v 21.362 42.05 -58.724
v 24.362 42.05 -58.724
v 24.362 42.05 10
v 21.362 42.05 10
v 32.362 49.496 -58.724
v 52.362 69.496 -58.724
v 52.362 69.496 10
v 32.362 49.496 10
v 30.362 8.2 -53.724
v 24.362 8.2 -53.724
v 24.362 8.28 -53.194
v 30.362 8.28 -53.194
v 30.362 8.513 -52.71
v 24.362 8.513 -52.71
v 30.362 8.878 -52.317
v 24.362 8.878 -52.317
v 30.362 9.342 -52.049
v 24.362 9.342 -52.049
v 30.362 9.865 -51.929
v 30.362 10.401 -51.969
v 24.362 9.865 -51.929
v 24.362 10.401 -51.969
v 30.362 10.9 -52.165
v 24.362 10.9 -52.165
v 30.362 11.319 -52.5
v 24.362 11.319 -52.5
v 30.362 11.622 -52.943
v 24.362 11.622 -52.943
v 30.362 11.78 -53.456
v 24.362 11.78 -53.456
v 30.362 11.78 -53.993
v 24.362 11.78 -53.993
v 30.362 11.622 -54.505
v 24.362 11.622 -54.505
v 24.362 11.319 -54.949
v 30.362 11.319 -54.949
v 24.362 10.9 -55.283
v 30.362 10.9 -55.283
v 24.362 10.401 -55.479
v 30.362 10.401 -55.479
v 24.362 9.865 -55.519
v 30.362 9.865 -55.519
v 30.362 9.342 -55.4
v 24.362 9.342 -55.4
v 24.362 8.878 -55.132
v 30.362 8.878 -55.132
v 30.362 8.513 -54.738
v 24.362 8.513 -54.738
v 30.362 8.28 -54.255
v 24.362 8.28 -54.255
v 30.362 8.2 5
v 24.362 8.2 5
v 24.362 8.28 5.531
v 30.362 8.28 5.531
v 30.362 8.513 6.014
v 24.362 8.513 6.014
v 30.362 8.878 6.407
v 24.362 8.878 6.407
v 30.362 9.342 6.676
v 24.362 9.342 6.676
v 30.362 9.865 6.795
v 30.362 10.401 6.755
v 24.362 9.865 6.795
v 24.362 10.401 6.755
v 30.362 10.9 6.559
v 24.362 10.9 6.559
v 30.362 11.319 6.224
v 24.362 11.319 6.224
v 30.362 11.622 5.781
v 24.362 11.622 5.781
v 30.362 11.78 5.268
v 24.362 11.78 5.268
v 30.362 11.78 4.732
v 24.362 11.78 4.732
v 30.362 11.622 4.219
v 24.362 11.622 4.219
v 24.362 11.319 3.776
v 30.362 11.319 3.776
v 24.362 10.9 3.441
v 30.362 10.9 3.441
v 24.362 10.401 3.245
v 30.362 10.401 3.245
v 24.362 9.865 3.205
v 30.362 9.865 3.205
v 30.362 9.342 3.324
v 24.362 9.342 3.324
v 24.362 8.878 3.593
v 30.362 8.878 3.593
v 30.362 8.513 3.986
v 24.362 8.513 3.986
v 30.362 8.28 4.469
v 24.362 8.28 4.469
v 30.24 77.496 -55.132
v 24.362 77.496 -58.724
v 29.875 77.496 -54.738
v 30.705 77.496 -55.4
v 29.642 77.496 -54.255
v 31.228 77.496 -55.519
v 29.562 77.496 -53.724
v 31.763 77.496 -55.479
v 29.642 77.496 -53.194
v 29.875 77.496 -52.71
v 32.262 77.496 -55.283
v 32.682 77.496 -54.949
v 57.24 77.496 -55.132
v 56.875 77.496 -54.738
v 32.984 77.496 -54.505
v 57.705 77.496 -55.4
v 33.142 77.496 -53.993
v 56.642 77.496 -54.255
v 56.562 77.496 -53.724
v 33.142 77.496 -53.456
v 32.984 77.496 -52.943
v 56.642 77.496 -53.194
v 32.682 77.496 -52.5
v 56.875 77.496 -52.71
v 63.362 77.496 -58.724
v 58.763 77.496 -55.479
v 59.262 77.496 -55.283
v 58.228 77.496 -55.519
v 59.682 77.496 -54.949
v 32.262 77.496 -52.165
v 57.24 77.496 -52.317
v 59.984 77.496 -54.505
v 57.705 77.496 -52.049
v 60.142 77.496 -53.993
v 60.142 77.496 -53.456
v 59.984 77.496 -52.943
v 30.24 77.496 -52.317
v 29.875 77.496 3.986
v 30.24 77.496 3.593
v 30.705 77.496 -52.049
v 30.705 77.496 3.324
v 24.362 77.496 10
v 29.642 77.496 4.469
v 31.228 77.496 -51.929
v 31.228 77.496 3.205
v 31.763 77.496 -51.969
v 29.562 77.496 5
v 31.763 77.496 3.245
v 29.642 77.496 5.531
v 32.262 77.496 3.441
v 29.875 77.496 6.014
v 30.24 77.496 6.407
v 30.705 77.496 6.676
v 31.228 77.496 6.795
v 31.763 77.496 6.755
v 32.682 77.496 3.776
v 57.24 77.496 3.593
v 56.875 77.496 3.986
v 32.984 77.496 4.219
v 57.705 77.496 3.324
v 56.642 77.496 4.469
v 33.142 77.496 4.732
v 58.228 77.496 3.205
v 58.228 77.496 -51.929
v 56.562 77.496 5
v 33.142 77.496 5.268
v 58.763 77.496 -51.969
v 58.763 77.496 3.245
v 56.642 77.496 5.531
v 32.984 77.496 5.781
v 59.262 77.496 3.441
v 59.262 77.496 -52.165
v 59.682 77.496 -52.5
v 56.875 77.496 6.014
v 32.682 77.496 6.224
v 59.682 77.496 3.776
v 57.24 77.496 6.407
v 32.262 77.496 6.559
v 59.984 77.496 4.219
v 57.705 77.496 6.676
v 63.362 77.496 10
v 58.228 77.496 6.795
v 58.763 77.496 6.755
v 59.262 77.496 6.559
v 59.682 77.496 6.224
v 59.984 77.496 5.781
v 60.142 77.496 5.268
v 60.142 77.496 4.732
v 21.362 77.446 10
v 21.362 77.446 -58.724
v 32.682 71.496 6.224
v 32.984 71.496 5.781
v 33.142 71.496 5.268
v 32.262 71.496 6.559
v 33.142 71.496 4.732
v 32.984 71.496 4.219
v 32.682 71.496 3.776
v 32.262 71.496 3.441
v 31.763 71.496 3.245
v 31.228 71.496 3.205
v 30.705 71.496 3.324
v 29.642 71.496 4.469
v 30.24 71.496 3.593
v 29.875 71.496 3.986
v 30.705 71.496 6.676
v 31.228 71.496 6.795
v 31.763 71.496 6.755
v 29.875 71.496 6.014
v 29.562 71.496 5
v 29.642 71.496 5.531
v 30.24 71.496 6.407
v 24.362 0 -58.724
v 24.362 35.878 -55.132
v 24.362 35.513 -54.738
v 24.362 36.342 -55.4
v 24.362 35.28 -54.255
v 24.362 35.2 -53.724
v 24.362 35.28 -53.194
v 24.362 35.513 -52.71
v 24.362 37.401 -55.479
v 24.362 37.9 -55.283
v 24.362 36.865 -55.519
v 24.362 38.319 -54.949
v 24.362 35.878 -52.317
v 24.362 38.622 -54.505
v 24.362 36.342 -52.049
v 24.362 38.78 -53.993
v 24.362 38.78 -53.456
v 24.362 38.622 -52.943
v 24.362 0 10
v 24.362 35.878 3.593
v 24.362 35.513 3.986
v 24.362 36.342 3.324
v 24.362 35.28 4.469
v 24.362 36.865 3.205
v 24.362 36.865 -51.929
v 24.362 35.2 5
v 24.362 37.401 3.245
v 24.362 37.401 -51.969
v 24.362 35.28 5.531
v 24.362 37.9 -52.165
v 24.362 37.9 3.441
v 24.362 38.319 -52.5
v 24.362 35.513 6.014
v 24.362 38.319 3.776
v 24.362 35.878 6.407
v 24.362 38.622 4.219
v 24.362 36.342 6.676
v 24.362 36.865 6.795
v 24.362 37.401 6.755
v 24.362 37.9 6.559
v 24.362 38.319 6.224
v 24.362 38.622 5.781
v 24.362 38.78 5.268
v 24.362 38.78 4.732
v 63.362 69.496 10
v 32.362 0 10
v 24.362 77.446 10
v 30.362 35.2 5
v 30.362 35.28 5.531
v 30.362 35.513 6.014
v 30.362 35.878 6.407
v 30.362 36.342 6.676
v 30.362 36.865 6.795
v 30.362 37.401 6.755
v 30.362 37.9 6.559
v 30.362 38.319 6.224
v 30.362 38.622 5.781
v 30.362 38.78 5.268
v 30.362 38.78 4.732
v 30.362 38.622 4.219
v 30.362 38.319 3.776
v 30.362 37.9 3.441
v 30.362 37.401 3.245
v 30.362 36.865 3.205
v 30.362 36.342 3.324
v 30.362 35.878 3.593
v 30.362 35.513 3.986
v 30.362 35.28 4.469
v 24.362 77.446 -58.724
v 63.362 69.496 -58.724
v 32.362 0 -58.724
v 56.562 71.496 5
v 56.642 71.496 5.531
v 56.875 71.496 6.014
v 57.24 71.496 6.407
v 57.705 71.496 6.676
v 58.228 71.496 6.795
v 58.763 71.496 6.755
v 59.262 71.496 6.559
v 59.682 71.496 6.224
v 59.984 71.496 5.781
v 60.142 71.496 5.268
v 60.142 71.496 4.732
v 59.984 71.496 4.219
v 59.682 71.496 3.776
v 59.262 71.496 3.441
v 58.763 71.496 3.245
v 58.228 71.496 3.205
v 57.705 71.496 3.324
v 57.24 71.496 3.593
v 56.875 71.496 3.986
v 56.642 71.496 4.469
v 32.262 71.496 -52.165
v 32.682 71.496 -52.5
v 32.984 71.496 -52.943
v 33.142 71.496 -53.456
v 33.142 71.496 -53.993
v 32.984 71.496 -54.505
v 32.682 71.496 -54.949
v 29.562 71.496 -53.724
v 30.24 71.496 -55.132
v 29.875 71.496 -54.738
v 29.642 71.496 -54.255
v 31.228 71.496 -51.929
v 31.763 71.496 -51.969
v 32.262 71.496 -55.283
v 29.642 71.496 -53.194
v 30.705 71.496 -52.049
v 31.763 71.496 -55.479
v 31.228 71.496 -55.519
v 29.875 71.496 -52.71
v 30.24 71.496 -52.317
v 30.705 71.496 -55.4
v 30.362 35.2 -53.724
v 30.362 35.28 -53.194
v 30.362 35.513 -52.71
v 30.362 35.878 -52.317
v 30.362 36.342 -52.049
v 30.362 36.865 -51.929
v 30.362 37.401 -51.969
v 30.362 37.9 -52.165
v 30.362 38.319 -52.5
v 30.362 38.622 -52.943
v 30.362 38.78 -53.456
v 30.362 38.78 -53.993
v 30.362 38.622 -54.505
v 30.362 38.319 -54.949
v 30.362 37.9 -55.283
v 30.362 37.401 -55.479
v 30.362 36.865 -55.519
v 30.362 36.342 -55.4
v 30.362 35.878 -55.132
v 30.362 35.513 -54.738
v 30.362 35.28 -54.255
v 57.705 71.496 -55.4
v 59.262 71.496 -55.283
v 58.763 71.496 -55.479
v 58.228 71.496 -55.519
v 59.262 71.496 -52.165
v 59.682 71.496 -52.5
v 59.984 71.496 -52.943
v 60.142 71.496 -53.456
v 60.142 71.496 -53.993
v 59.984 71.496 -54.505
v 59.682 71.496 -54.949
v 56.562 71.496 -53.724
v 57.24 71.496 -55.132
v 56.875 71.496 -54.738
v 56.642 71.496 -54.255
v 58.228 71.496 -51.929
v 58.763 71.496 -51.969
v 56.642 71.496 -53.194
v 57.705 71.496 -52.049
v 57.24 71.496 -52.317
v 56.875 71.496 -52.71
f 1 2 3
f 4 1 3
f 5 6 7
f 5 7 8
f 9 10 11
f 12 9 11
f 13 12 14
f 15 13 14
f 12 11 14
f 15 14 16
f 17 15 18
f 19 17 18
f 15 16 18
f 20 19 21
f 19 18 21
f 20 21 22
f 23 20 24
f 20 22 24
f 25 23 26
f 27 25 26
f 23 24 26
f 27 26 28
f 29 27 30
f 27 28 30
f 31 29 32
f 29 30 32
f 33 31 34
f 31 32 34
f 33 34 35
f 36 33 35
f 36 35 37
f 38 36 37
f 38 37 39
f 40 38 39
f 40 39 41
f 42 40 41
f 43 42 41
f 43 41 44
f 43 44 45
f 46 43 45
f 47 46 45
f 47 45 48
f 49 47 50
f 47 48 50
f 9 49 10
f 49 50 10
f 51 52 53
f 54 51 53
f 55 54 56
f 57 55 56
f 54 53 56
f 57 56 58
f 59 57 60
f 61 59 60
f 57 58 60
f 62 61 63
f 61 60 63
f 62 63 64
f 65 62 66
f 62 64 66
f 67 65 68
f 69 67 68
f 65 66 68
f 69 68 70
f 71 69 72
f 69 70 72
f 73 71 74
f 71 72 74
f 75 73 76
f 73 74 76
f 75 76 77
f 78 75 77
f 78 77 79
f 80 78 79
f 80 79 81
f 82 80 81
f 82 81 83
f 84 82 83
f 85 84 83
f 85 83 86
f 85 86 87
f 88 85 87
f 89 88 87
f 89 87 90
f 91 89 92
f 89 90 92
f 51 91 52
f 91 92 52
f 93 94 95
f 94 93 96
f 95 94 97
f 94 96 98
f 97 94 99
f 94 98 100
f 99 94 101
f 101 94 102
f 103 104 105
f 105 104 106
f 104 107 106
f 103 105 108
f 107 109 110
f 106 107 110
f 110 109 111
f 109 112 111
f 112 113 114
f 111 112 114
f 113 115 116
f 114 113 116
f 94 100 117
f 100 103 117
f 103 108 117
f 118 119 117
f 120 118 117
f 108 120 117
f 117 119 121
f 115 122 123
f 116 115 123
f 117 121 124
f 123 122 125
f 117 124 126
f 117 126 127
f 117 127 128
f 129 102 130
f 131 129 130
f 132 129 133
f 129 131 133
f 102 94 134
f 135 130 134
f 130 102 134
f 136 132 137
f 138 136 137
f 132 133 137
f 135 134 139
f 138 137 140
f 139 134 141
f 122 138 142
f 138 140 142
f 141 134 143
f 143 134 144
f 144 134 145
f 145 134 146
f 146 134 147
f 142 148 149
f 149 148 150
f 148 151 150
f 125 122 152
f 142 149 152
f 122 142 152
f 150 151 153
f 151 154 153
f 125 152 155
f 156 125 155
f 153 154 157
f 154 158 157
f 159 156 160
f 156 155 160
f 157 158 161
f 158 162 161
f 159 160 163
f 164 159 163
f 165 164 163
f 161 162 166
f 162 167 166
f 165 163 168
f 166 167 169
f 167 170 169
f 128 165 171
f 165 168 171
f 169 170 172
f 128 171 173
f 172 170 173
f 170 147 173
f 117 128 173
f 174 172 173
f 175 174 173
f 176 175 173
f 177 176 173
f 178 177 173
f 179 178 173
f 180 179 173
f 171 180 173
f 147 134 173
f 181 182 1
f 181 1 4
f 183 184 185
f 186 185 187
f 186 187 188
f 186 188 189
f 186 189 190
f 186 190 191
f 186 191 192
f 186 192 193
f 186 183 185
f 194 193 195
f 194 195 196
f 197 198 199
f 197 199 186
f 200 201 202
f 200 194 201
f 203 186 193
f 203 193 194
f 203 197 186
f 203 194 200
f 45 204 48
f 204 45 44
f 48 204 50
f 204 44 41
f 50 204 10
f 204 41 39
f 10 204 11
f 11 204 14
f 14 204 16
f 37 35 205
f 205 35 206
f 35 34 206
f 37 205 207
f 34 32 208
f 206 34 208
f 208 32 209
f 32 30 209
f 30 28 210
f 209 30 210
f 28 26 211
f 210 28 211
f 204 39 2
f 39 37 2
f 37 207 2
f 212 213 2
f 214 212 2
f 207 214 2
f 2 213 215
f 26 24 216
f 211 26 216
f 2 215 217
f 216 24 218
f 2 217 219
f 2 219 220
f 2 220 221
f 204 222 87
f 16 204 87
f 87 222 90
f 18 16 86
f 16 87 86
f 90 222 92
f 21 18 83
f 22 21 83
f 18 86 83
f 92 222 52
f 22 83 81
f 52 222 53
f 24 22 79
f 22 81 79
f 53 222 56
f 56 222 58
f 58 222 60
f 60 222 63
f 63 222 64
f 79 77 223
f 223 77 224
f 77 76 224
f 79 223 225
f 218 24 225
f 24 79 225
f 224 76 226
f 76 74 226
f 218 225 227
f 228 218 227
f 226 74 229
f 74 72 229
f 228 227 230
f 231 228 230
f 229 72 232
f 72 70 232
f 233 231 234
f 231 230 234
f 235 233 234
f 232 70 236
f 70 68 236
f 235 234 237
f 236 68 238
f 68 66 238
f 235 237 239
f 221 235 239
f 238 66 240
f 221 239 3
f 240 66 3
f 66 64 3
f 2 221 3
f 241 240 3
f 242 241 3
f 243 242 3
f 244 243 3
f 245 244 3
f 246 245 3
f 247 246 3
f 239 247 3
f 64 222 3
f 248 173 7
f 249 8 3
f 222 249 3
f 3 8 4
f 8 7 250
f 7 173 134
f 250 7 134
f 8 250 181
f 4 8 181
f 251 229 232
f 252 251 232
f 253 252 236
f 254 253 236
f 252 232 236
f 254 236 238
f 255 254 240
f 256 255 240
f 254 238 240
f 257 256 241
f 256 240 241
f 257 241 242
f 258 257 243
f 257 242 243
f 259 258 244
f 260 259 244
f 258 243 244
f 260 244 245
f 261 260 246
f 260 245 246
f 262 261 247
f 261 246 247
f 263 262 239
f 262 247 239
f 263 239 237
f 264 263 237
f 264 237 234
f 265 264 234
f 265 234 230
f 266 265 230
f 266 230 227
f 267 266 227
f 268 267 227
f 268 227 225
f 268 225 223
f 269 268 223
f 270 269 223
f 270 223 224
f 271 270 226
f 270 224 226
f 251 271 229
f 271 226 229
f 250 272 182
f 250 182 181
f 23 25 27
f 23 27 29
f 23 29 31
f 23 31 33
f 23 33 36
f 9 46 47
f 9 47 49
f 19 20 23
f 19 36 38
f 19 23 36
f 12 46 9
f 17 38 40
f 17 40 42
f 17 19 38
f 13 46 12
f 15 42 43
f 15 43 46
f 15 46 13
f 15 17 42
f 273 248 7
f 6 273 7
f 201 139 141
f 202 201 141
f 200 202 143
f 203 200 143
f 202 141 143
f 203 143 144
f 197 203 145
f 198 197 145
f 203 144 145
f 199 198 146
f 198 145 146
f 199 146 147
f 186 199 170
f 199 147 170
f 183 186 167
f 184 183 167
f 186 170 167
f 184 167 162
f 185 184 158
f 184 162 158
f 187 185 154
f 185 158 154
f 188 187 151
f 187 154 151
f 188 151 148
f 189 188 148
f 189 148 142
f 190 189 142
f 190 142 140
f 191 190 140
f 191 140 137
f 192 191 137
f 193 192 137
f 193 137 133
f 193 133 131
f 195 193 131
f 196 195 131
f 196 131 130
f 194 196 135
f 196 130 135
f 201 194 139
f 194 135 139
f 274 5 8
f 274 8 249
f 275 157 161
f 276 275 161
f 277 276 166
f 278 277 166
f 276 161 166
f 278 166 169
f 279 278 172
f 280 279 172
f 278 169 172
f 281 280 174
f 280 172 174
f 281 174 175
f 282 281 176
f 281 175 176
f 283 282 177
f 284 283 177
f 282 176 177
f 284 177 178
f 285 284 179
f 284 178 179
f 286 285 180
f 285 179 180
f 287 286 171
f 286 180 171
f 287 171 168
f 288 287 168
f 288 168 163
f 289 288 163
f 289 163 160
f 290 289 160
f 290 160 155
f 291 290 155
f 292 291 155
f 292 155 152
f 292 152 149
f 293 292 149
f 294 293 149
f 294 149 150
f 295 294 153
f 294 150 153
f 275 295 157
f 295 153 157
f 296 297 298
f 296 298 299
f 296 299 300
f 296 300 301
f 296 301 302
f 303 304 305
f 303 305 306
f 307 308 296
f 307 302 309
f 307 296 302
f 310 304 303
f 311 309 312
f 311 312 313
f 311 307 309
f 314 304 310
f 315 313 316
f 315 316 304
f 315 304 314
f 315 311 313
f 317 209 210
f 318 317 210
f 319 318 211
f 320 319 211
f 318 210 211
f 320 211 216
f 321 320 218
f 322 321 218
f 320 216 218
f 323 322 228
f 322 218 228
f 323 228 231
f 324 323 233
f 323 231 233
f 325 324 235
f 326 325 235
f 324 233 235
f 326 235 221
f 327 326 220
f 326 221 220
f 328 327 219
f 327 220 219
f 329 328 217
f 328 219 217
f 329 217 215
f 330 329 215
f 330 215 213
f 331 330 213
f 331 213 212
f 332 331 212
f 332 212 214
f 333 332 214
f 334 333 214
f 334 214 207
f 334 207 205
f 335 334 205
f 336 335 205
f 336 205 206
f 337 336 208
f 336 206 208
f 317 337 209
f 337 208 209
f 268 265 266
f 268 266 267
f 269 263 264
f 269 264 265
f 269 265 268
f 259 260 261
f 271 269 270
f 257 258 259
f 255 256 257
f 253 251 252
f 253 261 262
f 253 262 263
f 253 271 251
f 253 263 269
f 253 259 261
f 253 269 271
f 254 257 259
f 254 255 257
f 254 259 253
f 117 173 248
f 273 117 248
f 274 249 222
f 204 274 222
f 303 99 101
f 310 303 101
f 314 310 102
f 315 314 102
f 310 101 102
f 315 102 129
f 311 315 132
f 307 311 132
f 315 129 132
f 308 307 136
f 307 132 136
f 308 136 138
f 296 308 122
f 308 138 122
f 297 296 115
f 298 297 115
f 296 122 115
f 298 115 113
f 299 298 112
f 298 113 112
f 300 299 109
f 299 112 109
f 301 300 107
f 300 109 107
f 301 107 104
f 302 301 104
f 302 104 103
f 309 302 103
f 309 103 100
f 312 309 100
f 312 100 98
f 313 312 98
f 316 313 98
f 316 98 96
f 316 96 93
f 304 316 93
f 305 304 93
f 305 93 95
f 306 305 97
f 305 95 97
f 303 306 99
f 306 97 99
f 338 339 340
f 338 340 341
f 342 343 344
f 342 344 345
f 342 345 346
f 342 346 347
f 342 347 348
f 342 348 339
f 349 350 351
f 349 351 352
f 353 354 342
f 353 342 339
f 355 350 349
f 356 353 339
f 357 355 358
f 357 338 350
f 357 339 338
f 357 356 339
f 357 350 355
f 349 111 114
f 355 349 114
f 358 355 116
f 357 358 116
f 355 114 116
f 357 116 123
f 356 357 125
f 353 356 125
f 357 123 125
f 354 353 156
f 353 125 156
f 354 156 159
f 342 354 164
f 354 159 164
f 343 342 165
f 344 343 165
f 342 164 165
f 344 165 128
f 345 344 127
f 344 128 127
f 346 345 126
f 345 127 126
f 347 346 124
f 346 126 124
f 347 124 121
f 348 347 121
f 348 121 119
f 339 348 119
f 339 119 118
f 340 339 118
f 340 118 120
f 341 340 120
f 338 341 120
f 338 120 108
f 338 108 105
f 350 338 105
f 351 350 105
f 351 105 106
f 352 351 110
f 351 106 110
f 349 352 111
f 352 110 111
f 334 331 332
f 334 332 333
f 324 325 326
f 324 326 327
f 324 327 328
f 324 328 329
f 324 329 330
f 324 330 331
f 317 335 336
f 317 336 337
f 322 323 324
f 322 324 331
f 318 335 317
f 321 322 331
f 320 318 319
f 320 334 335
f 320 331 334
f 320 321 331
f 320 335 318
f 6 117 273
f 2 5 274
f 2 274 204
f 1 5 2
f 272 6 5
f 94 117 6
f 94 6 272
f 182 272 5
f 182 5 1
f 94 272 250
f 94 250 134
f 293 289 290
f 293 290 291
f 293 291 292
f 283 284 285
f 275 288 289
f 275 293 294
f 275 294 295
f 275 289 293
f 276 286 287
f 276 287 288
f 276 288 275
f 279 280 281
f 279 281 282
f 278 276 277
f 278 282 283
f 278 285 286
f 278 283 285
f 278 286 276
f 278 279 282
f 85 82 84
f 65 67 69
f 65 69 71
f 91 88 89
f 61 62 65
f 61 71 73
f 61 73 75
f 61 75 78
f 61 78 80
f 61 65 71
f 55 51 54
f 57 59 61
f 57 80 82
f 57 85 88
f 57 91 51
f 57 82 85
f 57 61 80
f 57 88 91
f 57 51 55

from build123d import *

# Parameters (mm, degrees)
BOSS_EXTRUDE1_DEPTH = 68.724264069
BOSS_EXTRUDE2_DEPTH = 68.724264069
SKETCH2_R           = 1.8
CUT_EXTRUDE1_DEPTH  = 6
SKETCH3_R           = 1.8
CUT_EXTRUDE2_DEPTH  = 6
SKETCH5_W           = 68.724264069
SKETCH5_H           = 35.396446609
BOSS_EXTRUDE3_DEPTH = 3


with BuildPart() as part:
    # Sketch1 → Boss-Extrude1 (new body)
    with BuildSketch(Plane.XY.offset(10)):
        Polygon((24.362132034, 0), (24.362132034, 77.496446609), (63.362132034, 77.496446609), (63.362132034, 69.496446609), (32.362132034, 69.496446609), (32.362132034, 0), align=None)
    extrude(amount=-BOSS_EXTRUDE1_DEPTH)

    # Sketch4 → Boss-Extrude2 (add)
    with BuildSketch(Plane.XY.offset(10)):
        Polygon((32.362132034, 49.496446609), (32.362132034, 69.496446609), (52.362132034, 69.496446609), align=None)
    extrude(amount=-BOSS_EXTRUDE2_DEPTH)

    # Sketch2 → Cut-Extrude1 (cut)
    with BuildSketch(Plane(origin=(0, 77.496446609, 0), x_dir=(1, 0, 0), z_dir=(0, 1, 0))):
        with Locations(Location((58.362132034, 53.724264069, 0), (0, 0, 180))):
            Circle(SKETCH2_R)
        with Locations(Location((31.362132034, 53.724264069, 0), (0, 0, 180))):
            Circle(SKETCH2_R)
        with Locations(Location((58.362132034, -5, 0), (0, 0, 180))):
            Circle(SKETCH2_R)
        with Locations(Location((31.362132034, -5, 0), (0, 0, 180))):
            Circle(SKETCH2_R)
    extrude(amount=-CUT_EXTRUDE1_DEPTH, mode=Mode.SUBTRACT)

    # Sketch3 → Cut-Extrude2 (cut)
    with BuildSketch(Plane.ZY.offset(-24.362132034)):
        with Locations(Location((-53.724264069, 37, 0), (0, 0, 270))):
            Circle(SKETCH3_R)
        with Locations(Location((-53.724264069, 10, 0), (0, 0, 270))):
            Circle(SKETCH3_R)
        with Locations(Location((5, 10, 0), (0, 0, 270))):
            Circle(SKETCH3_R)
        with Locations(Location((5, 37, 0), (0, 0, 270))):
            Circle(SKETCH3_R)
    extrude(amount=-CUT_EXTRUDE2_DEPTH, mode=Mode.SUBTRACT)

    # Sketch5 → Boss-Extrude3 (add)
    with BuildSketch(Plane.ZY.offset(-24.362132034)):
        with Locations((-24.362132035, 59.748223305)):
            Rectangle(SKETCH5_W, SKETCH5_H)
    extrude(amount=BOSS_EXTRUDE3_DEPTH)


solid = part.part
